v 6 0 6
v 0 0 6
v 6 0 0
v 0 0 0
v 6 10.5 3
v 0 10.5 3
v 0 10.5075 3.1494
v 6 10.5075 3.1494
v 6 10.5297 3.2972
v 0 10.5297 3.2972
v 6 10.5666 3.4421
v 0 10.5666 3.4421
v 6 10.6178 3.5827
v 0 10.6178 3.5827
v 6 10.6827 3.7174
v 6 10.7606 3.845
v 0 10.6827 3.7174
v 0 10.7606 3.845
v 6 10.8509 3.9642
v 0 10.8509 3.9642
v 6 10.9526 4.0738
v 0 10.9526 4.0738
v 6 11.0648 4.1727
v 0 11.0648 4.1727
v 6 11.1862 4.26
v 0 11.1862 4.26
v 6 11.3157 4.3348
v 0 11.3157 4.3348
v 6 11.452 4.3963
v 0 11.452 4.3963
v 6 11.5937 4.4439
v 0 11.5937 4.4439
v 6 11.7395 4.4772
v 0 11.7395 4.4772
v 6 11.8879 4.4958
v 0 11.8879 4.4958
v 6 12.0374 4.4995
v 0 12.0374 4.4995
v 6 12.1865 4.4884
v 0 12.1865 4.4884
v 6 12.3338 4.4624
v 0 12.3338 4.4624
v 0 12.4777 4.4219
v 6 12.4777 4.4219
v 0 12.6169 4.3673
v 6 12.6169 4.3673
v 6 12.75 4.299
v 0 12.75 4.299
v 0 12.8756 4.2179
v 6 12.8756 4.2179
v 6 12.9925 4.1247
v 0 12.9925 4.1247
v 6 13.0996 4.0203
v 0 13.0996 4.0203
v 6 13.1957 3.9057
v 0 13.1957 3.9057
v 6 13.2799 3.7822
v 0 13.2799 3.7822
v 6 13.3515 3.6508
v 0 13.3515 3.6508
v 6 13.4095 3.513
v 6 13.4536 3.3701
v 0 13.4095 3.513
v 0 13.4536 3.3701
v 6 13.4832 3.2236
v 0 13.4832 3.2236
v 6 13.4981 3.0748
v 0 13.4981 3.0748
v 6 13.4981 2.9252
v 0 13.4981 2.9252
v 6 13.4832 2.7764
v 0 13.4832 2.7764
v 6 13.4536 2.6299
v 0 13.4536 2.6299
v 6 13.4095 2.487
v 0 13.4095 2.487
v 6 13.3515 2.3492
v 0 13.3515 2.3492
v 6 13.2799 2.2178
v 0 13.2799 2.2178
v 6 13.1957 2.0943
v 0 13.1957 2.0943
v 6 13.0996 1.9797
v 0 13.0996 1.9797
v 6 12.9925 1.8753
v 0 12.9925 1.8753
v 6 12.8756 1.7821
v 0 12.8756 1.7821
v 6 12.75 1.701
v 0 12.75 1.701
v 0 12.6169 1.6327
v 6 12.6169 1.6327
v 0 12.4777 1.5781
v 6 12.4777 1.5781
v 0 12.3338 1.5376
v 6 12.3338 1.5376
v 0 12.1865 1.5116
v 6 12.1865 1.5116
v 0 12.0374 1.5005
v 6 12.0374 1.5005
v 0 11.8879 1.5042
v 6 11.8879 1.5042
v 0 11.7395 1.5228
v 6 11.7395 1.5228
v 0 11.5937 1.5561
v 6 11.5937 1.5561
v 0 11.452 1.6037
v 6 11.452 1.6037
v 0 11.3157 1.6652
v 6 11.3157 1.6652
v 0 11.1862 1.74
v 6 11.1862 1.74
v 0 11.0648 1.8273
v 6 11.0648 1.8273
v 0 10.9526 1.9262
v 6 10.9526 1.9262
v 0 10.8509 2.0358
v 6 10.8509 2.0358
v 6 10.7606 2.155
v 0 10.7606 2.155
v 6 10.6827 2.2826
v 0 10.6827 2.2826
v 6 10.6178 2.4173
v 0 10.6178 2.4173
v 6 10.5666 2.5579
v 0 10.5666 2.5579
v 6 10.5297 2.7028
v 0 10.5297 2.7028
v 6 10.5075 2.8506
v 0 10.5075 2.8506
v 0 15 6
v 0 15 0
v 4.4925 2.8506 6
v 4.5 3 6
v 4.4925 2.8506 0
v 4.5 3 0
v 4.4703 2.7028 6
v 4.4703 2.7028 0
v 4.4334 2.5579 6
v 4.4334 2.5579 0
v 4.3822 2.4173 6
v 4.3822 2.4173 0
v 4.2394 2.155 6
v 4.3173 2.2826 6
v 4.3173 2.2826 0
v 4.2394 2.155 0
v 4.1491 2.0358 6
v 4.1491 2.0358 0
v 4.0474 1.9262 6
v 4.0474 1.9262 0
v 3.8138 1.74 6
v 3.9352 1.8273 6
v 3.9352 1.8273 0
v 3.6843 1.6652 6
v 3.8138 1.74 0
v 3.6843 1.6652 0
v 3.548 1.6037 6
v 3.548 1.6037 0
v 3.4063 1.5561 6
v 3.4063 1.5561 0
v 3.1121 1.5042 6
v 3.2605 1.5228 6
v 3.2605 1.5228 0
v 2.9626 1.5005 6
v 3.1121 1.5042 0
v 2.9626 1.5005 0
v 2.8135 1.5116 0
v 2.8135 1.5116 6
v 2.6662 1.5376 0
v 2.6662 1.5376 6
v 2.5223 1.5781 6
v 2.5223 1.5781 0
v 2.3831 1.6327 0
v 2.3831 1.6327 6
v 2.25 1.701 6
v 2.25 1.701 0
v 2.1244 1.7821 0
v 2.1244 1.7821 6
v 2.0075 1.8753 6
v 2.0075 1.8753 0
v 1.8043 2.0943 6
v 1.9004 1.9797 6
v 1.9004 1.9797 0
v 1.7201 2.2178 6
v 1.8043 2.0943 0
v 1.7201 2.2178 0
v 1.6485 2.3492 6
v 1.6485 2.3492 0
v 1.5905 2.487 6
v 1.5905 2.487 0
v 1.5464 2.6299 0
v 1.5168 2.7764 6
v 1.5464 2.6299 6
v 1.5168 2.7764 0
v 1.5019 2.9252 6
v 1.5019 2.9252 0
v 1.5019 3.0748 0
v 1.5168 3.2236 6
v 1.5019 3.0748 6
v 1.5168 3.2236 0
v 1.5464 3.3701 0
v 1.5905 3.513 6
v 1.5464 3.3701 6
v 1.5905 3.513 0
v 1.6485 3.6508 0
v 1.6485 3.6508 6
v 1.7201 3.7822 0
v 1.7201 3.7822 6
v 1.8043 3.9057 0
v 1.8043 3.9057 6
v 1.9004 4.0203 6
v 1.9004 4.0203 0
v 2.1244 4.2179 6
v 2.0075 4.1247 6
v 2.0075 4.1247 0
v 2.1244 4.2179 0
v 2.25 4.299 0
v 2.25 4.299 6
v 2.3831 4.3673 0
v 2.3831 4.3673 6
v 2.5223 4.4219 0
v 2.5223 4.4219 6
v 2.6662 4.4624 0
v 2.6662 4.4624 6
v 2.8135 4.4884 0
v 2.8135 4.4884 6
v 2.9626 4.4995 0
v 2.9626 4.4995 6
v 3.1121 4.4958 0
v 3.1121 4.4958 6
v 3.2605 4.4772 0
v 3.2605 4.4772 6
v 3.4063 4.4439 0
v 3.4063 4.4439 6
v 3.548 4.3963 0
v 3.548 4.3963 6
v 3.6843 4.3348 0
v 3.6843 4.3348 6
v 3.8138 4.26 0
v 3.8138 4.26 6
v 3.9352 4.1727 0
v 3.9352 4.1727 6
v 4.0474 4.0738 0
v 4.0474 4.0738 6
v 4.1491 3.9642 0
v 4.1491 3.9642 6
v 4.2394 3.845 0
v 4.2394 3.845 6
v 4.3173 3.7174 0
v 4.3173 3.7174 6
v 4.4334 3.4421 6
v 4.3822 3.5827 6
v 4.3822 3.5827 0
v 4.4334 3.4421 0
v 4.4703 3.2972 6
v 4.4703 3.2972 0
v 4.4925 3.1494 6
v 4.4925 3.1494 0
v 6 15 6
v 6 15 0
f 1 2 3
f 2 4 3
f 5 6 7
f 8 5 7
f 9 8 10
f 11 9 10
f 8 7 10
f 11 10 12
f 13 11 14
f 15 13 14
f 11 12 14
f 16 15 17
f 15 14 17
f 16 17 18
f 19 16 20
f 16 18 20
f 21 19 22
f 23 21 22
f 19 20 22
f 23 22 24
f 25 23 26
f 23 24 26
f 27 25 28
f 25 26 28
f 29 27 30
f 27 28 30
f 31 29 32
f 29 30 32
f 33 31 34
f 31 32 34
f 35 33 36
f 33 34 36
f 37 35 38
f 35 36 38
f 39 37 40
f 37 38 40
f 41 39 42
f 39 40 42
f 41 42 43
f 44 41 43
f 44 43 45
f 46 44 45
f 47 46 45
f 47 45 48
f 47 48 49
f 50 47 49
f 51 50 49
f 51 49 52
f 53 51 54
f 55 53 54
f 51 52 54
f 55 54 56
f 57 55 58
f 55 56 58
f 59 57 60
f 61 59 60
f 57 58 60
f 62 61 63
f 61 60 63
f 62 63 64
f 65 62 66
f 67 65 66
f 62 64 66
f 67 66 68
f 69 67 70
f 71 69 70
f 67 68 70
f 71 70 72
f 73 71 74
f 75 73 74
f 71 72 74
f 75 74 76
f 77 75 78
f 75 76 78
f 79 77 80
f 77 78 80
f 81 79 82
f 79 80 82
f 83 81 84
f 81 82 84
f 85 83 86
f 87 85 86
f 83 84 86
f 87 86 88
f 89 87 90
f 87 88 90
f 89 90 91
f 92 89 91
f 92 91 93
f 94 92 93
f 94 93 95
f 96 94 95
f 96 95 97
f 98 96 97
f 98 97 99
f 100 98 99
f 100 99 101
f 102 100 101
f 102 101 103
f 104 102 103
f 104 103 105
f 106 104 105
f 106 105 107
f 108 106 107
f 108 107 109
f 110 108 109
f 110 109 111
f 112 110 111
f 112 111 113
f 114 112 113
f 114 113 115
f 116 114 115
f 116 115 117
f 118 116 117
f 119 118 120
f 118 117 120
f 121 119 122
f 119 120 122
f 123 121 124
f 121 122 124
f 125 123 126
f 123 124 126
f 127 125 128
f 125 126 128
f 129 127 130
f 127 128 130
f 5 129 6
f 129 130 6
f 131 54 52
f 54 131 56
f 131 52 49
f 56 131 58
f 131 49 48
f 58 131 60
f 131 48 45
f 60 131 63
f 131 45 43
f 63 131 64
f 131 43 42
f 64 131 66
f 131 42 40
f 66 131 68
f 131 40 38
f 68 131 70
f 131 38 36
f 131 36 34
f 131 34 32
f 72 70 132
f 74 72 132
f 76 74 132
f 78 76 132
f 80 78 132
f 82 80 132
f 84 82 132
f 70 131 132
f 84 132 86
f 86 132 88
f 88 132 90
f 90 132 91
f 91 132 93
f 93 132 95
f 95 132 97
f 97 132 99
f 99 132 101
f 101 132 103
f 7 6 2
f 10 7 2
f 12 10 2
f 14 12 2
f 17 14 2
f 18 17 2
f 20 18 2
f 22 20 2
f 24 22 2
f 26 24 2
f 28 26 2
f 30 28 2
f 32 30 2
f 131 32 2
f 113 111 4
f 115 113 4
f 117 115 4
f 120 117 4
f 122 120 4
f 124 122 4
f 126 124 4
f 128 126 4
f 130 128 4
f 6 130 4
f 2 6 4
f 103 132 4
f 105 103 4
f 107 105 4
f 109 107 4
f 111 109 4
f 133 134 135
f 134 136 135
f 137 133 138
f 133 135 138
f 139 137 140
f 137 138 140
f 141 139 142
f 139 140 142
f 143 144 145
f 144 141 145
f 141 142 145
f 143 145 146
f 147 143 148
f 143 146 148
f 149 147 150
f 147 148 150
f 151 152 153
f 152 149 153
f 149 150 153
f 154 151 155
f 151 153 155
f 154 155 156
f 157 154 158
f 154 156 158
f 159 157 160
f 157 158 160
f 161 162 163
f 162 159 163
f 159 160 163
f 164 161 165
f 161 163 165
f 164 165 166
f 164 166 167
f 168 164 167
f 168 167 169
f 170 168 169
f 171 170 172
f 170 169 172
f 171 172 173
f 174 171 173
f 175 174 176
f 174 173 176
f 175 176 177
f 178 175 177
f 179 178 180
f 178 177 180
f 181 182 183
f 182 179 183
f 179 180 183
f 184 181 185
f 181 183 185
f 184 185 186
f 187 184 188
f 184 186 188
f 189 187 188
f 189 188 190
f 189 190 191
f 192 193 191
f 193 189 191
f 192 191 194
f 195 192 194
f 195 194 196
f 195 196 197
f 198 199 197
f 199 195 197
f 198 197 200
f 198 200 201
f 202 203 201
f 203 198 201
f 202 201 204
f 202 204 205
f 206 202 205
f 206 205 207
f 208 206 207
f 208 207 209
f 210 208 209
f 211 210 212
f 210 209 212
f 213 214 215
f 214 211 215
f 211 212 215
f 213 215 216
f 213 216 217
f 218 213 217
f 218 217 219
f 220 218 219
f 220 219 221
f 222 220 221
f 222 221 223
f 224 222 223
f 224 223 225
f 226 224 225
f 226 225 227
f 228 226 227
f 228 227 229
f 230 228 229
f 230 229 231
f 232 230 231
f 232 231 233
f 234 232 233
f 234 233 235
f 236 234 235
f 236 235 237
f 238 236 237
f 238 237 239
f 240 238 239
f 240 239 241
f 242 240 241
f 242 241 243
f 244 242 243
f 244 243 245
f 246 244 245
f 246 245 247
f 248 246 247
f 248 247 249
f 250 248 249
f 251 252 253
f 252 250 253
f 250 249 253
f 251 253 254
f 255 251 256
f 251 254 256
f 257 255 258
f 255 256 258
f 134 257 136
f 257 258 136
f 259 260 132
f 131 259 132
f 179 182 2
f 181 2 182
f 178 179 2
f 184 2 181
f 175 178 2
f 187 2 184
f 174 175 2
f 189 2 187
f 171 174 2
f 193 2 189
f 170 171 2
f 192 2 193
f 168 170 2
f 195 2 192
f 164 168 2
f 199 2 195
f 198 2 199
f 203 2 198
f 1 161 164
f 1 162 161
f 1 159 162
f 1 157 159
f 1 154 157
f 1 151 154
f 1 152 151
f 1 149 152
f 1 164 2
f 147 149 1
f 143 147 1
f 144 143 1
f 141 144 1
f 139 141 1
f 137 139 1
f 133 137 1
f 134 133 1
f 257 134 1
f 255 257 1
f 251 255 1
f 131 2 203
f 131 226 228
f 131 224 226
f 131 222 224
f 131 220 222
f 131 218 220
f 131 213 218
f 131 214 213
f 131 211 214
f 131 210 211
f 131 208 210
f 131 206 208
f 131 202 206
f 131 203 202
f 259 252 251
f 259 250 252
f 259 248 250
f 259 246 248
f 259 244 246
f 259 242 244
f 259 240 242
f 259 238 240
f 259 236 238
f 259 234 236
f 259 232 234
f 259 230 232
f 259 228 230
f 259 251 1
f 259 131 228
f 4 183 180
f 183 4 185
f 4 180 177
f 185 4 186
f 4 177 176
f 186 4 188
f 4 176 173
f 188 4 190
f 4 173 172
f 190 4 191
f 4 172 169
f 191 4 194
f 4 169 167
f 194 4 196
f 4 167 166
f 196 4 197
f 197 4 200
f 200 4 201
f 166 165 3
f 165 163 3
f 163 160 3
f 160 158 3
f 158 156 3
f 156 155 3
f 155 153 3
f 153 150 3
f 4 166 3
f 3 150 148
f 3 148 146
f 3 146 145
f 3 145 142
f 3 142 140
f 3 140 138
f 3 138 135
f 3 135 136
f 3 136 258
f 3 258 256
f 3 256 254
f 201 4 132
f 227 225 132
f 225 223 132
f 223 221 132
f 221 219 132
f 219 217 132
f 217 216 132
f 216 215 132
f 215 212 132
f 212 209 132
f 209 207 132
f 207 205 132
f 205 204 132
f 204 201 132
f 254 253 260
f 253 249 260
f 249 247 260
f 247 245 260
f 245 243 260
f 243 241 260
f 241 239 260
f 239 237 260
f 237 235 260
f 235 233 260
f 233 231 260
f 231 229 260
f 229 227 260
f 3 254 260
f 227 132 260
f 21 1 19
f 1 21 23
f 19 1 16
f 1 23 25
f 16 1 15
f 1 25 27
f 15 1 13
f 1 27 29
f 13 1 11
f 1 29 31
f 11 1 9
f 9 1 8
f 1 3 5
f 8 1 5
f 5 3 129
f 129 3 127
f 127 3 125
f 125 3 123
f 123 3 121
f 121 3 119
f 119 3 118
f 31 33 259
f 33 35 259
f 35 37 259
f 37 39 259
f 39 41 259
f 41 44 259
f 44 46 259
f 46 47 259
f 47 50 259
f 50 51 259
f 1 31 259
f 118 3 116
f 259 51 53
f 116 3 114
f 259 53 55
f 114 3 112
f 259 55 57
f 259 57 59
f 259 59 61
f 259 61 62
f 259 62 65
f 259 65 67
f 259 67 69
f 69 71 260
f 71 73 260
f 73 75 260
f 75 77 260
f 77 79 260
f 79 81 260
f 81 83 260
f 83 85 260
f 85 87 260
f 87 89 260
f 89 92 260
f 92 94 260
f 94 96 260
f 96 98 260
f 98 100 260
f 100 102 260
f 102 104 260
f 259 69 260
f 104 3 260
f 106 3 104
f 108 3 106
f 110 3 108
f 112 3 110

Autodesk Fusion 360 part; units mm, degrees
sketch "Sketch1" plane through (0, 0, 0) normal (0, 0, 1) x (1, 0, 0)
  line L0 (0, 0) -> (6, 0)
  line L1 (6, 0) -> (6, 15)
  line L2 (6, 15) -> (0, 15)
  line L3 (0, 15) -> (0, 0)
  circle A0 centre (3, 3) radius 1.5
  dimension "d1" = 6
  dimension "d2" = 15
  dimension "d3" = 3
  dimension "d4" = 3
  dimension "d5" = 3
extrude "Extrude1" add sketch "Sketch1" along normal blind 6
sketch "Sketch2" plane through (0, 0, 0) normal (-1, 0, 0) x (0, -1, 0)
  line L0 (-15, 0) -> (0, 0)
  line L1 (0, 0) -> (0, 6)
  line L2 (0, 6) -> (-15, 6)
  line L3 (-15, 6) -> (-15, 0)
  circle A0 centre (-12, 3) radius 1.5
  dimension "d8" = 3
  dimension "d9" = 3
  dimension "d10" = 3
extrude "Extrude2" cut sketch "Sketch2" against normal blind 6 contours A0
